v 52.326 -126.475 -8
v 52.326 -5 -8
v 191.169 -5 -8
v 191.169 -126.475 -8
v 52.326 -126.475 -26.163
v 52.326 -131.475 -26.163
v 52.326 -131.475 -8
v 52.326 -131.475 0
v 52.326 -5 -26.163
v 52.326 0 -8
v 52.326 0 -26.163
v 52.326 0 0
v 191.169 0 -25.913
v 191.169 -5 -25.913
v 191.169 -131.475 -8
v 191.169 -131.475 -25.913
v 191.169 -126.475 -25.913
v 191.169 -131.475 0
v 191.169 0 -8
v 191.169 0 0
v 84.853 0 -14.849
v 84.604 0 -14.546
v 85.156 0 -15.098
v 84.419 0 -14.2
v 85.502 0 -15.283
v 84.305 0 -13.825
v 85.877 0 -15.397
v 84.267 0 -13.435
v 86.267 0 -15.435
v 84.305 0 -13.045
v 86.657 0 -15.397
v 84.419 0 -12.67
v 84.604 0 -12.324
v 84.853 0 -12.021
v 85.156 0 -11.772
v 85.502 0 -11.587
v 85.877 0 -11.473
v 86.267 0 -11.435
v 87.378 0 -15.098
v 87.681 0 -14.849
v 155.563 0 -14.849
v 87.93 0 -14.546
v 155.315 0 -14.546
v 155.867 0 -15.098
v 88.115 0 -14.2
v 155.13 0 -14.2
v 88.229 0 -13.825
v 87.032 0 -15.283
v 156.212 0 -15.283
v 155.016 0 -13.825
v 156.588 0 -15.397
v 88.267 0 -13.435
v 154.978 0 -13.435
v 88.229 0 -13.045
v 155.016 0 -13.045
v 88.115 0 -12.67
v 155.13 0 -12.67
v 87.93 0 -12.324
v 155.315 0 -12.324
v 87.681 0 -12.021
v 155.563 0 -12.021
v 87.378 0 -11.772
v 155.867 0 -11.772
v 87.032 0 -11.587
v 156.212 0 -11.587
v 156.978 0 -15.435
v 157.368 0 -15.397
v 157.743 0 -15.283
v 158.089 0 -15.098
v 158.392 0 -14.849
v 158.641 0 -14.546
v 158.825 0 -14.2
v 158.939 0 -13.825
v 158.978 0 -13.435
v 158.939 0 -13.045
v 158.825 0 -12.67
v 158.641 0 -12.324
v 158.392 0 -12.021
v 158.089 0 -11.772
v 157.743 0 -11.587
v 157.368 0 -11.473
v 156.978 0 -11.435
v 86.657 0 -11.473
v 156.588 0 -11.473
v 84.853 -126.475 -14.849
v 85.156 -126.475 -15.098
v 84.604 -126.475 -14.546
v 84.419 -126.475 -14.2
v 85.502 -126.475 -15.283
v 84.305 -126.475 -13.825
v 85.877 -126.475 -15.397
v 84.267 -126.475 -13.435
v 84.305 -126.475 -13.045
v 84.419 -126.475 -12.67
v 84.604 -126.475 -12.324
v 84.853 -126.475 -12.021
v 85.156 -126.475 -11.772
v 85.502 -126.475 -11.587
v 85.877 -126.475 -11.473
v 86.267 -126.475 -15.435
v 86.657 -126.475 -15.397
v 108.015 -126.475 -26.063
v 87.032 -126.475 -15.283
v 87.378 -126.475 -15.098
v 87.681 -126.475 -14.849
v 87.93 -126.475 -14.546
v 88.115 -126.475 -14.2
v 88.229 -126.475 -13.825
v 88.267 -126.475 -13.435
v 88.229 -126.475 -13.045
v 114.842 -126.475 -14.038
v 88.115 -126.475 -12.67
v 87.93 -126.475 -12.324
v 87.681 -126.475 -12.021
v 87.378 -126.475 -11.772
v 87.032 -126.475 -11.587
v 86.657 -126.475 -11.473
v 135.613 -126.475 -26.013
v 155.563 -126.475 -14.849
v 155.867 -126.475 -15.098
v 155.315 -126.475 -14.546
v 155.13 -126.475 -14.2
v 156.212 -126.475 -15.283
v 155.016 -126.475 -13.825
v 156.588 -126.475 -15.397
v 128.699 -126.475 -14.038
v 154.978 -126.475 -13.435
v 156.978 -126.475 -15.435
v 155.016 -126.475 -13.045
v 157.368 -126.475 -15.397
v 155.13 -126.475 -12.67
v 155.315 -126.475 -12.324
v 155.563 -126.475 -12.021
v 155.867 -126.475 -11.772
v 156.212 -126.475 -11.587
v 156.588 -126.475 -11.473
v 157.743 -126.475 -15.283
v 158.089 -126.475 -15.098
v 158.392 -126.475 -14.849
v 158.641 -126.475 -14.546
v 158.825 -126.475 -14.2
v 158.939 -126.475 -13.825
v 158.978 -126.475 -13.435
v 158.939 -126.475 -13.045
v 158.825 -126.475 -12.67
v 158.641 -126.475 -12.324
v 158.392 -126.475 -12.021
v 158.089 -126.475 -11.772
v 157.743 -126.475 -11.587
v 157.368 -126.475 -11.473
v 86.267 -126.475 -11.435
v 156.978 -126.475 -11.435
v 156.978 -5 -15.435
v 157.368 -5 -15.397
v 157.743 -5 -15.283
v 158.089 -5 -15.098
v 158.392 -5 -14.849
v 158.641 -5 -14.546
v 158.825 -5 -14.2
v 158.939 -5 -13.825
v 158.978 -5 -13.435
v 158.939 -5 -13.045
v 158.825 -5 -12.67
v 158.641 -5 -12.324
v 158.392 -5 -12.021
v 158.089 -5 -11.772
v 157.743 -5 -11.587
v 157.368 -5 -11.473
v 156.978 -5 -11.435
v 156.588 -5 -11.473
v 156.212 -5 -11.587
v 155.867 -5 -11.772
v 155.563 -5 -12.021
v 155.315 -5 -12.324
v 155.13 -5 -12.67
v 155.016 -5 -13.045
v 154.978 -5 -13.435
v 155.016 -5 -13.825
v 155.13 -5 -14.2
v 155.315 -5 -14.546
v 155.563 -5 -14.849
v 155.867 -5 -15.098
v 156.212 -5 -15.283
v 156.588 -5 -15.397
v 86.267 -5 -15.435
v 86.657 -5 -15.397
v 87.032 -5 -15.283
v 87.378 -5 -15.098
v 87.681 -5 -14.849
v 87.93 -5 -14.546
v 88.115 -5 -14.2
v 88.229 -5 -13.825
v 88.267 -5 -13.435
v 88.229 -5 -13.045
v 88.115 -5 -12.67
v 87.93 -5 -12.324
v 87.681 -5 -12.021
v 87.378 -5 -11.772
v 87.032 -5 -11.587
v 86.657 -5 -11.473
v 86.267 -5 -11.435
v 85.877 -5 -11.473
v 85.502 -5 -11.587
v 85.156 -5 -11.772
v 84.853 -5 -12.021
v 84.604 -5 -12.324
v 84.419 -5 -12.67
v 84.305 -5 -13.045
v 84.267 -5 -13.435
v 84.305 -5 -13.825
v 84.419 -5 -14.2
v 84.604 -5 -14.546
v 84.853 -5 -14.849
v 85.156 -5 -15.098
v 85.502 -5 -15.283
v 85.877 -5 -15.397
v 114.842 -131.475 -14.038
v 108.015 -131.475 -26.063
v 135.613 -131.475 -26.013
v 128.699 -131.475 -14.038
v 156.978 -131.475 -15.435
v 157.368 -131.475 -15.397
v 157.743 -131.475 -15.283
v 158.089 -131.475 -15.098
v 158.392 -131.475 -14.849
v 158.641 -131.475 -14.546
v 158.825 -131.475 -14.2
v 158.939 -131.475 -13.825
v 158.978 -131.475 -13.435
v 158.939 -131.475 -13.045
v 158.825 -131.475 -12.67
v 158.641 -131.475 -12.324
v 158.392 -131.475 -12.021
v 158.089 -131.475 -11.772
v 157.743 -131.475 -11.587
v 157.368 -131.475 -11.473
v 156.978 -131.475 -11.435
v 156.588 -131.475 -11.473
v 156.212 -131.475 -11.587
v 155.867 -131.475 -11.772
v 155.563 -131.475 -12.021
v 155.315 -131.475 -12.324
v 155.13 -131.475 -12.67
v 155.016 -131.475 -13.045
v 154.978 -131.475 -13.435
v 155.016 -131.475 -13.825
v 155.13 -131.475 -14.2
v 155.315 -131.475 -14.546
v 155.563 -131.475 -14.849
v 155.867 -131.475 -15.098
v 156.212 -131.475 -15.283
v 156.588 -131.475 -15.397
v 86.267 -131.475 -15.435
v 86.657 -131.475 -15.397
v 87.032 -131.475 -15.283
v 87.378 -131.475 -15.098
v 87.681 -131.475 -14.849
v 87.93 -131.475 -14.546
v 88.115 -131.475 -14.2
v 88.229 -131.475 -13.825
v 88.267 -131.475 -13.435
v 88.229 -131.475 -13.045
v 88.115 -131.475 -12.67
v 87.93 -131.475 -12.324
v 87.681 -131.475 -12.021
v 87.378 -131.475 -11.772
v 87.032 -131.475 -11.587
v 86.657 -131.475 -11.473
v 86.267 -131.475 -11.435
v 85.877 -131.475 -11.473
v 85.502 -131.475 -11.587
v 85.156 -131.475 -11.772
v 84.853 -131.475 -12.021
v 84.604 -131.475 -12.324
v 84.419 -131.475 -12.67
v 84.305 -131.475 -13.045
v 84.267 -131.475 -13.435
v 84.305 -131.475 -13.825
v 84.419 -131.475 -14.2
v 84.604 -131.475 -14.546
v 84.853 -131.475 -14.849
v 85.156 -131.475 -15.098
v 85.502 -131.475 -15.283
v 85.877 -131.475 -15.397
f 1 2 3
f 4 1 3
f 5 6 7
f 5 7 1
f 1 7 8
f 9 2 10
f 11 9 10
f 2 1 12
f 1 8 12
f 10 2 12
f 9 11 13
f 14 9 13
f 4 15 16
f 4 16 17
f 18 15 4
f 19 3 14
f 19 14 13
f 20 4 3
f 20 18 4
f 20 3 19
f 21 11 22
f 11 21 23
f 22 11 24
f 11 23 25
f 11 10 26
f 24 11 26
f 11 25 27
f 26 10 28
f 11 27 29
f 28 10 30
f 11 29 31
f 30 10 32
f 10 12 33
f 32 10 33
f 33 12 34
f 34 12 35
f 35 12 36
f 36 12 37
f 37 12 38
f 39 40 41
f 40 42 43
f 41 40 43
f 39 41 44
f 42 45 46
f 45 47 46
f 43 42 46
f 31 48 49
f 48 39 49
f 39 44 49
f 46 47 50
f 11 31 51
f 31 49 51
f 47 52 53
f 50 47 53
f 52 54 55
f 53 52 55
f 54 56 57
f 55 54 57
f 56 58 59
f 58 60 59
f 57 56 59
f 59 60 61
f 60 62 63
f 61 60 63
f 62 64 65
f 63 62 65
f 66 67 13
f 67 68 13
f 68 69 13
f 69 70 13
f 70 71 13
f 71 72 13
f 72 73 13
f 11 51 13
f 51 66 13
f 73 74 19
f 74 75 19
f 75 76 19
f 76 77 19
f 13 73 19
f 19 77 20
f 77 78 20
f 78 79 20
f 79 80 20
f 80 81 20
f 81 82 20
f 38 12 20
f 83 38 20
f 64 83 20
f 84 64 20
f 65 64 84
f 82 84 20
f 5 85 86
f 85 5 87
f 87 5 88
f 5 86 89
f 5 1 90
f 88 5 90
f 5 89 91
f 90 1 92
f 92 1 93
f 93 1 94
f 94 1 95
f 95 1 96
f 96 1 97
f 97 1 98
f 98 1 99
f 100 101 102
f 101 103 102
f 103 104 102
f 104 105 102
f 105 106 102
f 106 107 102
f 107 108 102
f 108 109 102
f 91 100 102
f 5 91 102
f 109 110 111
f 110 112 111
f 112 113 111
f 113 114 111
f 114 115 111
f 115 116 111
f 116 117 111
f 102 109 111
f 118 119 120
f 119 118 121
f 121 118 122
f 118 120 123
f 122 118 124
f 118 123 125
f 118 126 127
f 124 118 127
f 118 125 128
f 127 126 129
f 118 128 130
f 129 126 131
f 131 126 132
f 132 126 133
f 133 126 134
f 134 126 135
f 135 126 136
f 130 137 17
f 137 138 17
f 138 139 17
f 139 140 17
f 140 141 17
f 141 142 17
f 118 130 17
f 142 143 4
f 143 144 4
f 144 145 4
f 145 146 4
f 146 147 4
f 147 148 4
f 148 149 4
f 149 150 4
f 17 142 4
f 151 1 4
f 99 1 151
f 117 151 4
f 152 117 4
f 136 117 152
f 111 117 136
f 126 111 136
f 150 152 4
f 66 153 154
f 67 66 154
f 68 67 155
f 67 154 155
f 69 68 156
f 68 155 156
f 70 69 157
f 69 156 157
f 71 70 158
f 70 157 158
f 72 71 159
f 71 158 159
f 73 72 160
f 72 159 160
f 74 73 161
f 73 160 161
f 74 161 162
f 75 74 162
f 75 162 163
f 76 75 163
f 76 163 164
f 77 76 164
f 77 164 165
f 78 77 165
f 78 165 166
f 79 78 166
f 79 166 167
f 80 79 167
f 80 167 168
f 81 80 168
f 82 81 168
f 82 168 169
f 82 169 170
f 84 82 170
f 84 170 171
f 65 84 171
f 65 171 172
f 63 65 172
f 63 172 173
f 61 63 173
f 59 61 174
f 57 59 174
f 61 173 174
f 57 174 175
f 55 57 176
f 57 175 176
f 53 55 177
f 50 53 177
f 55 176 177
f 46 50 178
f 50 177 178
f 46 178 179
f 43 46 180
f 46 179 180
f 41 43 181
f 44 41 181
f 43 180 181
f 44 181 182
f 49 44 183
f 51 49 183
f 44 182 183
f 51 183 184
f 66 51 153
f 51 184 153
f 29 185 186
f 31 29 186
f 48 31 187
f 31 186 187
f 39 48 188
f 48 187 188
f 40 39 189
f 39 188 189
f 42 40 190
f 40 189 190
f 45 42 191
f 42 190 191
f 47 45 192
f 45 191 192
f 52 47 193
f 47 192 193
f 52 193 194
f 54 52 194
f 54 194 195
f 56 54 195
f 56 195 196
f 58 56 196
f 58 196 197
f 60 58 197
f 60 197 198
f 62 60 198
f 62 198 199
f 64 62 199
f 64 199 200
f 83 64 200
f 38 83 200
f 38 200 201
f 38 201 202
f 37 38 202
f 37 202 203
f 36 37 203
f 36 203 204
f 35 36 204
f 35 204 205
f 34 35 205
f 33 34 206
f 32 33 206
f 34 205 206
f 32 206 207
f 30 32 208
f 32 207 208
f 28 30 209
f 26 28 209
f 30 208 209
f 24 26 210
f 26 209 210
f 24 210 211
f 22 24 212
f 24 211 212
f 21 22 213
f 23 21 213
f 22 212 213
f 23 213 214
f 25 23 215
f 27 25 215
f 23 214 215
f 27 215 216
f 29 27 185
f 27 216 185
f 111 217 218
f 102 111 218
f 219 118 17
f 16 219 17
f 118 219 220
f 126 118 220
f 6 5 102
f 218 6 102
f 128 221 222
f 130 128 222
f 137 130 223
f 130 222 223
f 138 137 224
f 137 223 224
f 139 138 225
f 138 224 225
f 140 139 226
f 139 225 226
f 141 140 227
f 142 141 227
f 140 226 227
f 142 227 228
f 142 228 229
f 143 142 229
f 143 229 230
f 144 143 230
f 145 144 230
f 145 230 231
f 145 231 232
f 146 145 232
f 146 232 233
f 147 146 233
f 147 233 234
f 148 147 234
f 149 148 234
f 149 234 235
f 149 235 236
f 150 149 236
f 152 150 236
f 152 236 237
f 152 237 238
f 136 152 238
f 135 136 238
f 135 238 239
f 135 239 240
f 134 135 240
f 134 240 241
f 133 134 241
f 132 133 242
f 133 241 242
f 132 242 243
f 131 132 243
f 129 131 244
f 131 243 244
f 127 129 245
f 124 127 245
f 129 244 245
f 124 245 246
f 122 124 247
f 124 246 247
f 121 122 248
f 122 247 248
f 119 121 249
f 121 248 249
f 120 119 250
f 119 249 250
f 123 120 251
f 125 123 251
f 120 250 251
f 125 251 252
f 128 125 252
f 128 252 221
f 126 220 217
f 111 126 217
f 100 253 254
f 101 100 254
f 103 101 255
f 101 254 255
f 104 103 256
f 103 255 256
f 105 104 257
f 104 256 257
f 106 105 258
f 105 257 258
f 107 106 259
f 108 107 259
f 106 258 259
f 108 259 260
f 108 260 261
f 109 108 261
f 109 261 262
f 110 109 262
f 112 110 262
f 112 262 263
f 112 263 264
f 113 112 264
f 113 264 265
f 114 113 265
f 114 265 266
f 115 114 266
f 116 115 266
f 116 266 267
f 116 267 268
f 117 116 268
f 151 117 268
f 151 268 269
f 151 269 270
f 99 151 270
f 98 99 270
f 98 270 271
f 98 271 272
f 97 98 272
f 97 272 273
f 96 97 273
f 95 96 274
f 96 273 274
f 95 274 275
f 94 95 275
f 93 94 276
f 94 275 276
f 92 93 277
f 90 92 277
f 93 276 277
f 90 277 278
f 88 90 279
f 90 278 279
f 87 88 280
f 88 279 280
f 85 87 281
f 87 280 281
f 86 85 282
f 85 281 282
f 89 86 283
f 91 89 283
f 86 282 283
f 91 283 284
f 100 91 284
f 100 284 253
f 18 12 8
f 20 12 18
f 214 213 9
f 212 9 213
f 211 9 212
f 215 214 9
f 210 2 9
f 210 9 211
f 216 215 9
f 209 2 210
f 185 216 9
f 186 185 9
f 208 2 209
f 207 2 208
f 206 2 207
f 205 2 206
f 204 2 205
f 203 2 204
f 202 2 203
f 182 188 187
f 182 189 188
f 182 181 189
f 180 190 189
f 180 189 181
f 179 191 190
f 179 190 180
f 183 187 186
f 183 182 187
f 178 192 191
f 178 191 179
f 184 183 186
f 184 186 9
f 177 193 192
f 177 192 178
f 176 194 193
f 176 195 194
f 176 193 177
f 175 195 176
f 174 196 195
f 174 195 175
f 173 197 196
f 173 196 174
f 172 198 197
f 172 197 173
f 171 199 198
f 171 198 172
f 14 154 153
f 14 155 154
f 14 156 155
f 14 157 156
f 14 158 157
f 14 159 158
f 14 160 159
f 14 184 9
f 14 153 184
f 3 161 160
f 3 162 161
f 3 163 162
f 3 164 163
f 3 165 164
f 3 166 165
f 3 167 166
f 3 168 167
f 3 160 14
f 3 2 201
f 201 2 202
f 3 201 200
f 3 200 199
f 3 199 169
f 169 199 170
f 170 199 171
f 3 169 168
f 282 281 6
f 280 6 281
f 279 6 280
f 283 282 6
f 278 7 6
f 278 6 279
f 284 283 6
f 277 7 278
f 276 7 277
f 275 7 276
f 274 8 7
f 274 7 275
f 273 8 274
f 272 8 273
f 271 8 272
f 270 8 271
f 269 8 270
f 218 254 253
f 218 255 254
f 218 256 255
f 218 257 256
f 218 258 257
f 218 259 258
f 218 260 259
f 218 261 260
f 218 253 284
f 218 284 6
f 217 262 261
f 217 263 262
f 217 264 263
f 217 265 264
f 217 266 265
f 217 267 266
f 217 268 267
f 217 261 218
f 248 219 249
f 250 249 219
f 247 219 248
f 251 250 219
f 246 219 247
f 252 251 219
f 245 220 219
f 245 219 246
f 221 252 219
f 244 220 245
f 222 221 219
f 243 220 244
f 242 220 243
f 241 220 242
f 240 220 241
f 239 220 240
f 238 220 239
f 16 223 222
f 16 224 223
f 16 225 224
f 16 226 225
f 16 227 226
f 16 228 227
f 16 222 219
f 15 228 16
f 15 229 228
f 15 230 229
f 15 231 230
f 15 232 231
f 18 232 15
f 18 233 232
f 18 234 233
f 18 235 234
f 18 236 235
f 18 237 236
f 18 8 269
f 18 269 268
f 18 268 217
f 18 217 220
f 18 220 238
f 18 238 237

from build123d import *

# Parameters (mm, degrees)
SKETCH1_W           = 138.84292961
SKETCH1_H           = 131.475201729
BOSS_EXTRUDE1_DEPTH = 8
BOSS_EXTRUDE2_REACH = 234.154
SKETCH3_W           = 138.84292961
SKETCH3_H           = 5
CUT_EXTRUDE1_REACH  = 235.486
SKETCH5_R           = 2
CUT_EXTRUDE2_DEPTH  = 234.486082153


with BuildPart() as part:
    # Sketch1 → Boss-Extrude1 (new body)
    with BuildSketch(Plane.XY):
        with Locations((121.747366115, -65.737600865)):
            Rectangle(SKETCH1_W, SKETCH1_H)
    extrude(amount=-BOSS_EXTRUDE1_DEPTH)

    # Boss-Extrude2: up to this plane
    boss_extrude2_end = Plane(origin=(52.32590131, -131.475201729, -26.162950407), z_dir=(-0.001800589328445012, 0, 0.9999983789377211))
    # Sketch3 → Boss-Extrude2 (add, up to the surface)
    with BuildSketch(Plane.XY, mode=Mode.PRIVATE) as boss_extrude2_sk1:
        with Locations((121.747366115, -2.5)):
            Rectangle(SKETCH3_W, SKETCH3_H)
    boss_extrude2_tool1 = split(extrude(boss_extrude2_sk1.sketch, amount=-BOSS_EXTRUDE2_REACH, mode=Mode.PRIVATE), bisect_by=boss_extrude2_end, keep=Keep.BOTH, mode=Mode.PRIVATE)
    add(boss_extrude2_tool1.solids().sort_by_distance((121.747366, -2.5, 0))[0])
    # Sketch3 → Boss-Extrude2 (add, up to the surface)
    with BuildSketch(Plane.XY, mode=Mode.PRIVATE) as boss_extrude2_sk2:
        with Locations((121.747366115, -128.975201729)):
            Rectangle(SKETCH3_W, SKETCH3_H)
    boss_extrude2_tool2 = split(extrude(boss_extrude2_sk2.sketch, amount=-BOSS_EXTRUDE2_REACH, mode=Mode.PRIVATE), bisect_by=boss_extrude2_end, keep=Keep.BOTH, mode=Mode.PRIVATE)
    add(boss_extrude2_tool2.solids().sort_by_distance((121.747366, -128.975202, 0))[0])

    # Sketch4 → Cut-Extrude1 (cut, up to next)
    with BuildSketch(Plane.XZ.offset(131.475201729), mode=Mode.PRIVATE) as cut_extrude1_sk1:
        Polygon((135.612712051, -26.012984821), (128.698898599, -14.037908649), (114.842492139, -14.037908649), (108.015470014, -26.062676201), align=None)
    cut_extrude1_tool1 = extrude(cut_extrude1_sk1.sketch, amount=-CUT_EXTRUDE1_REACH, mode=Mode.PRIVATE) & part.part
    add(cut_extrude1_tool1.solids().sort_by_distance((121.790009, -131.475202, -20.700826))[0], mode=Mode.SUBTRACT)

    # Sketch5 → Cut-Extrude2 (cut, through all)
    with BuildSketch(Plane.XZ.offset(131.475201729)):
        with Locations(Location((86.267027305, -13.435028843, 0), (0, 0, 270))):
            Circle(SKETCH5_R)
        with Locations(Location((156.977705423, -13.435028843, 0), (0, 0, 270))):
            Circle(SKETCH5_R)
    extrude(amount=-CUT_EXTRUDE2_DEPTH, mode=Mode.SUBTRACT)


solid = part.part
